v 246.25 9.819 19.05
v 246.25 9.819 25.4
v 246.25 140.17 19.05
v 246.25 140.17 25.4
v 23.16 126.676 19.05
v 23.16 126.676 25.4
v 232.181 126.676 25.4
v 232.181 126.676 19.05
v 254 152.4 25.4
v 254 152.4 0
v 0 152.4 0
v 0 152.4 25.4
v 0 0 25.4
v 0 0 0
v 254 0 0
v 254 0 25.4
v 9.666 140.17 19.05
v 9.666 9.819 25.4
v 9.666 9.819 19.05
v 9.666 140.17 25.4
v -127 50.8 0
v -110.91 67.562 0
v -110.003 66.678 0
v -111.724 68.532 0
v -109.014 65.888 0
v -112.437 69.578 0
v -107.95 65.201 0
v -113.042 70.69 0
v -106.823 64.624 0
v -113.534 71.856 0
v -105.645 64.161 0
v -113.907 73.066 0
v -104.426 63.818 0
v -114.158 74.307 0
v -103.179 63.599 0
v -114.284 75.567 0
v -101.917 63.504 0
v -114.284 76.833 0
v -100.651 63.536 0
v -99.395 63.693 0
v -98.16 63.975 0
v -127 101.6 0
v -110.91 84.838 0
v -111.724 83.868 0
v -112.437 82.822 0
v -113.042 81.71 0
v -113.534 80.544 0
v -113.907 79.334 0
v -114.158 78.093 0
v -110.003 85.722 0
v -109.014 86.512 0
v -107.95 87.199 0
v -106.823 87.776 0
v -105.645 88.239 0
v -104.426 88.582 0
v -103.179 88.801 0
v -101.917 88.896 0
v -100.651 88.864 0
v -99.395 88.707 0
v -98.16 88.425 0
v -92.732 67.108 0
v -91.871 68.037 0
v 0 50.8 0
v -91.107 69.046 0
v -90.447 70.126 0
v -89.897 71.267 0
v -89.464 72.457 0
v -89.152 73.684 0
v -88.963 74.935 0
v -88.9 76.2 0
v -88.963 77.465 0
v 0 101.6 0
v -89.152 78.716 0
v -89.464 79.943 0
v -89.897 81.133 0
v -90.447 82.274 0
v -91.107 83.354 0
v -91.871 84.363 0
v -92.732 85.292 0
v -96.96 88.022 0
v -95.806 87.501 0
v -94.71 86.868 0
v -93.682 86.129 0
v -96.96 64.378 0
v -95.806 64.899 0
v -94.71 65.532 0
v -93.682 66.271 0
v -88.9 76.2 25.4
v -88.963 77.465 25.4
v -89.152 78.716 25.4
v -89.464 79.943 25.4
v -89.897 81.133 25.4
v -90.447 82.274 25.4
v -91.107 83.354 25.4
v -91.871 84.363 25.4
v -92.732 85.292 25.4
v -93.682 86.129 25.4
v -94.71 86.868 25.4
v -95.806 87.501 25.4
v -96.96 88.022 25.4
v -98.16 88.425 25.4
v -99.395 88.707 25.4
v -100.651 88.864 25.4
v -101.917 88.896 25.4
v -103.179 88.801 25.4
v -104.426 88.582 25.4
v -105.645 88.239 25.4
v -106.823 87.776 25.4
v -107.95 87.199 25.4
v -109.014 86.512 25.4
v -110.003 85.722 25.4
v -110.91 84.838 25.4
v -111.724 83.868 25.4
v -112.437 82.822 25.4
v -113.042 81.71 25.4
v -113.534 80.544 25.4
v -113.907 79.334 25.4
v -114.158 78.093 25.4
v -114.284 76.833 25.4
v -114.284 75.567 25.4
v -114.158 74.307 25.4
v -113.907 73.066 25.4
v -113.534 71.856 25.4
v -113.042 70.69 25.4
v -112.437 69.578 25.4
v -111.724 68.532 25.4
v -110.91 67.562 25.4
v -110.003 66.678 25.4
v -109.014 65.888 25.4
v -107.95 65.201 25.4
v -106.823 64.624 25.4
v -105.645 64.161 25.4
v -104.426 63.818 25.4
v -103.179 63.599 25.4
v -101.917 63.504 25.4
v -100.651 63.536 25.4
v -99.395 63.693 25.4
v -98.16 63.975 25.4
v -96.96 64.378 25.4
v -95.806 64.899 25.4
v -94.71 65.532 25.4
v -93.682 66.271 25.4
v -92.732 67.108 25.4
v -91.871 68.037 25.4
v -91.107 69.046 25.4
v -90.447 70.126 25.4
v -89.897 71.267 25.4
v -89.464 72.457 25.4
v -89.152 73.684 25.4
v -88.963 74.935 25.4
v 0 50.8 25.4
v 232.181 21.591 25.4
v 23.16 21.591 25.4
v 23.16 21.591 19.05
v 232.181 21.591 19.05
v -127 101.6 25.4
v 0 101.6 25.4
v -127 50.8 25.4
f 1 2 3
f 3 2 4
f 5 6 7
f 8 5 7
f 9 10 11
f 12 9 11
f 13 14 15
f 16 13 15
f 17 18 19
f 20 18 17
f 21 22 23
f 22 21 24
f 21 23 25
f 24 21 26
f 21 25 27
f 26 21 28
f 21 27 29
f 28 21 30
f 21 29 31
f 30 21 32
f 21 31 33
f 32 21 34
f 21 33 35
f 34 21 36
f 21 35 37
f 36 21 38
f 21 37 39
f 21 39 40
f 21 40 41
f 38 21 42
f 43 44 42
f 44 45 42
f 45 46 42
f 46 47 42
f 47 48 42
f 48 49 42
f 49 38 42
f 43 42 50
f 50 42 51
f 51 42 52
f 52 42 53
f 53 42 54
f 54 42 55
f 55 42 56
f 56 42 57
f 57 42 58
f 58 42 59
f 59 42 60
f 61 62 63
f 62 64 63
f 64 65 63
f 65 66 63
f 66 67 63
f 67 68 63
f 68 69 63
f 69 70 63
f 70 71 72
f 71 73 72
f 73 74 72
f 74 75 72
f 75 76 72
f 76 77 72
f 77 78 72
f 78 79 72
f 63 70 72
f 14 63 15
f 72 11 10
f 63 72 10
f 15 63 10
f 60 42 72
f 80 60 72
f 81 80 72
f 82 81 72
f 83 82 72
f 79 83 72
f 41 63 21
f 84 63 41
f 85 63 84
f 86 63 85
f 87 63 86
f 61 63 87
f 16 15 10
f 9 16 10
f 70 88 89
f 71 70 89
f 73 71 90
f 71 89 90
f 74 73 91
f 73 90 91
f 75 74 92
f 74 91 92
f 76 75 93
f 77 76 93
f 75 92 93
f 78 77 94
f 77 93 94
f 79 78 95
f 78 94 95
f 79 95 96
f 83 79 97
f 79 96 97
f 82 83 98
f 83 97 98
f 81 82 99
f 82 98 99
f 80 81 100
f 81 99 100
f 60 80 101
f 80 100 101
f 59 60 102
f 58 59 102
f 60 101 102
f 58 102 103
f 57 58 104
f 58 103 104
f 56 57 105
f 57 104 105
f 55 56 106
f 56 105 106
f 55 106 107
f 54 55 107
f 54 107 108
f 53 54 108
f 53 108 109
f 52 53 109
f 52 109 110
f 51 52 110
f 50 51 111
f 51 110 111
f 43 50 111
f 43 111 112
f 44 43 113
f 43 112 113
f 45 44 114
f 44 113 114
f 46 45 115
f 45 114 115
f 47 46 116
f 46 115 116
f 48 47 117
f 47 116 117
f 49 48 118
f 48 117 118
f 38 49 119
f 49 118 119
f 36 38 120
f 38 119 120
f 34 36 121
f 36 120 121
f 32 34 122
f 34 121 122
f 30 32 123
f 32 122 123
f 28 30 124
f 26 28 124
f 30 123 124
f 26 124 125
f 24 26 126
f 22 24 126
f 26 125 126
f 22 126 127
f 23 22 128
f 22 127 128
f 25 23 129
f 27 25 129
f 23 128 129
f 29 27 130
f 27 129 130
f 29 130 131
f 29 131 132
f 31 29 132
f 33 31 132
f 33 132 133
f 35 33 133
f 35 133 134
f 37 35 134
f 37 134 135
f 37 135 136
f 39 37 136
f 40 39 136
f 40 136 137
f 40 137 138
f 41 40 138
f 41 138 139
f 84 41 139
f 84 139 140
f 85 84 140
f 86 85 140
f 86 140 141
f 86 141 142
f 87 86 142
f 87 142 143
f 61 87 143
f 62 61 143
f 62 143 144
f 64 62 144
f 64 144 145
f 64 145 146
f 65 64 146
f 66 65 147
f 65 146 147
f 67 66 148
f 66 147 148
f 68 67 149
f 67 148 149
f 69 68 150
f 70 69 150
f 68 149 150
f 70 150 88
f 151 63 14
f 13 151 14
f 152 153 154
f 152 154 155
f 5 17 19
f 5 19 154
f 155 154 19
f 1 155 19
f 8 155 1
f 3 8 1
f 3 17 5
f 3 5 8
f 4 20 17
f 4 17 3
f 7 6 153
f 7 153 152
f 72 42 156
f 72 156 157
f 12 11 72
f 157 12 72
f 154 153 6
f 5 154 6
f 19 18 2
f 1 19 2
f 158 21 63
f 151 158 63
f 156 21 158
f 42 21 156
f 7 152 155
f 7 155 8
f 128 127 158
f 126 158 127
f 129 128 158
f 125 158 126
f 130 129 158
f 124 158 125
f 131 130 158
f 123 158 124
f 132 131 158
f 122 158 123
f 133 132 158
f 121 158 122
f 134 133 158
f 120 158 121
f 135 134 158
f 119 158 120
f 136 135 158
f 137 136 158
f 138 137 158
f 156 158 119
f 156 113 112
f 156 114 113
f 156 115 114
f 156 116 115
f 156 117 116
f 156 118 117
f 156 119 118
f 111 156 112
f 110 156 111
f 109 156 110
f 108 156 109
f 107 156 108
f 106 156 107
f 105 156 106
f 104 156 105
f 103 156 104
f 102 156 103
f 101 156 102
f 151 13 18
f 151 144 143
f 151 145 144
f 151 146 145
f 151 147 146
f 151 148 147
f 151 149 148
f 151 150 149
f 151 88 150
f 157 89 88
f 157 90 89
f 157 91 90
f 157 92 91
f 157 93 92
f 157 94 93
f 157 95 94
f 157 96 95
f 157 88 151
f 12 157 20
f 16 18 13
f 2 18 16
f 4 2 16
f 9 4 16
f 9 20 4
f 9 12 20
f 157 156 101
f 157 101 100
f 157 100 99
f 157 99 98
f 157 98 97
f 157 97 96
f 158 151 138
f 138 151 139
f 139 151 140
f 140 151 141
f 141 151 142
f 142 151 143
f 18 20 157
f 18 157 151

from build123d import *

# Parameters (mm, degrees)
F0_W     = 127
F0_H     = 50.8
F1_DEPTH = 25.4
F2_R     = 12.7
F3_DEPTH = 25.4
F4_W     = 236.584601
F4_H     = 130.351219
F4_W_2   = 209.021354
F4_H_2   = 105.084905
F5_DEPTH = 6.35


with BuildPart() as f1:
    # F0 (on Top) → F1 (new body)
    with BuildSketch(Plane.XY):
        Polygon((0, 50.8), (0, 0), (254, 0), (254, 152.4), (0, 152.4), (0, 101.6), align=None)
        with Locations((-63.5, 76.2)):
            Rectangle(F0_W, F0_H)
    extrude(amount=F1_DEPTH)

    # F2 (on face) → F3 (cut)
    with BuildSketch(Plane.XY.offset(25.4)):
        with Locations((-101.6, 76.2)):
            Circle(F2_R)
    extrude(amount=-F3_DEPTH, mode=Mode.SUBTRACT)

    # F4 (on face) → F5 (cut)
    with BuildSketch(Plane.XY.offset(25.4)):
        with Locations((127.957823, 74.994562)):
            Rectangle(F4_W, F4_H)
        with Locations((127.670708, 74.133212)):
            Rectangle(F4_W_2, F4_H_2, mode=Mode.SUBTRACT)
    extrude(amount=-F5_DEPTH, mode=Mode.SUBTRACT)


solid = f1.part
